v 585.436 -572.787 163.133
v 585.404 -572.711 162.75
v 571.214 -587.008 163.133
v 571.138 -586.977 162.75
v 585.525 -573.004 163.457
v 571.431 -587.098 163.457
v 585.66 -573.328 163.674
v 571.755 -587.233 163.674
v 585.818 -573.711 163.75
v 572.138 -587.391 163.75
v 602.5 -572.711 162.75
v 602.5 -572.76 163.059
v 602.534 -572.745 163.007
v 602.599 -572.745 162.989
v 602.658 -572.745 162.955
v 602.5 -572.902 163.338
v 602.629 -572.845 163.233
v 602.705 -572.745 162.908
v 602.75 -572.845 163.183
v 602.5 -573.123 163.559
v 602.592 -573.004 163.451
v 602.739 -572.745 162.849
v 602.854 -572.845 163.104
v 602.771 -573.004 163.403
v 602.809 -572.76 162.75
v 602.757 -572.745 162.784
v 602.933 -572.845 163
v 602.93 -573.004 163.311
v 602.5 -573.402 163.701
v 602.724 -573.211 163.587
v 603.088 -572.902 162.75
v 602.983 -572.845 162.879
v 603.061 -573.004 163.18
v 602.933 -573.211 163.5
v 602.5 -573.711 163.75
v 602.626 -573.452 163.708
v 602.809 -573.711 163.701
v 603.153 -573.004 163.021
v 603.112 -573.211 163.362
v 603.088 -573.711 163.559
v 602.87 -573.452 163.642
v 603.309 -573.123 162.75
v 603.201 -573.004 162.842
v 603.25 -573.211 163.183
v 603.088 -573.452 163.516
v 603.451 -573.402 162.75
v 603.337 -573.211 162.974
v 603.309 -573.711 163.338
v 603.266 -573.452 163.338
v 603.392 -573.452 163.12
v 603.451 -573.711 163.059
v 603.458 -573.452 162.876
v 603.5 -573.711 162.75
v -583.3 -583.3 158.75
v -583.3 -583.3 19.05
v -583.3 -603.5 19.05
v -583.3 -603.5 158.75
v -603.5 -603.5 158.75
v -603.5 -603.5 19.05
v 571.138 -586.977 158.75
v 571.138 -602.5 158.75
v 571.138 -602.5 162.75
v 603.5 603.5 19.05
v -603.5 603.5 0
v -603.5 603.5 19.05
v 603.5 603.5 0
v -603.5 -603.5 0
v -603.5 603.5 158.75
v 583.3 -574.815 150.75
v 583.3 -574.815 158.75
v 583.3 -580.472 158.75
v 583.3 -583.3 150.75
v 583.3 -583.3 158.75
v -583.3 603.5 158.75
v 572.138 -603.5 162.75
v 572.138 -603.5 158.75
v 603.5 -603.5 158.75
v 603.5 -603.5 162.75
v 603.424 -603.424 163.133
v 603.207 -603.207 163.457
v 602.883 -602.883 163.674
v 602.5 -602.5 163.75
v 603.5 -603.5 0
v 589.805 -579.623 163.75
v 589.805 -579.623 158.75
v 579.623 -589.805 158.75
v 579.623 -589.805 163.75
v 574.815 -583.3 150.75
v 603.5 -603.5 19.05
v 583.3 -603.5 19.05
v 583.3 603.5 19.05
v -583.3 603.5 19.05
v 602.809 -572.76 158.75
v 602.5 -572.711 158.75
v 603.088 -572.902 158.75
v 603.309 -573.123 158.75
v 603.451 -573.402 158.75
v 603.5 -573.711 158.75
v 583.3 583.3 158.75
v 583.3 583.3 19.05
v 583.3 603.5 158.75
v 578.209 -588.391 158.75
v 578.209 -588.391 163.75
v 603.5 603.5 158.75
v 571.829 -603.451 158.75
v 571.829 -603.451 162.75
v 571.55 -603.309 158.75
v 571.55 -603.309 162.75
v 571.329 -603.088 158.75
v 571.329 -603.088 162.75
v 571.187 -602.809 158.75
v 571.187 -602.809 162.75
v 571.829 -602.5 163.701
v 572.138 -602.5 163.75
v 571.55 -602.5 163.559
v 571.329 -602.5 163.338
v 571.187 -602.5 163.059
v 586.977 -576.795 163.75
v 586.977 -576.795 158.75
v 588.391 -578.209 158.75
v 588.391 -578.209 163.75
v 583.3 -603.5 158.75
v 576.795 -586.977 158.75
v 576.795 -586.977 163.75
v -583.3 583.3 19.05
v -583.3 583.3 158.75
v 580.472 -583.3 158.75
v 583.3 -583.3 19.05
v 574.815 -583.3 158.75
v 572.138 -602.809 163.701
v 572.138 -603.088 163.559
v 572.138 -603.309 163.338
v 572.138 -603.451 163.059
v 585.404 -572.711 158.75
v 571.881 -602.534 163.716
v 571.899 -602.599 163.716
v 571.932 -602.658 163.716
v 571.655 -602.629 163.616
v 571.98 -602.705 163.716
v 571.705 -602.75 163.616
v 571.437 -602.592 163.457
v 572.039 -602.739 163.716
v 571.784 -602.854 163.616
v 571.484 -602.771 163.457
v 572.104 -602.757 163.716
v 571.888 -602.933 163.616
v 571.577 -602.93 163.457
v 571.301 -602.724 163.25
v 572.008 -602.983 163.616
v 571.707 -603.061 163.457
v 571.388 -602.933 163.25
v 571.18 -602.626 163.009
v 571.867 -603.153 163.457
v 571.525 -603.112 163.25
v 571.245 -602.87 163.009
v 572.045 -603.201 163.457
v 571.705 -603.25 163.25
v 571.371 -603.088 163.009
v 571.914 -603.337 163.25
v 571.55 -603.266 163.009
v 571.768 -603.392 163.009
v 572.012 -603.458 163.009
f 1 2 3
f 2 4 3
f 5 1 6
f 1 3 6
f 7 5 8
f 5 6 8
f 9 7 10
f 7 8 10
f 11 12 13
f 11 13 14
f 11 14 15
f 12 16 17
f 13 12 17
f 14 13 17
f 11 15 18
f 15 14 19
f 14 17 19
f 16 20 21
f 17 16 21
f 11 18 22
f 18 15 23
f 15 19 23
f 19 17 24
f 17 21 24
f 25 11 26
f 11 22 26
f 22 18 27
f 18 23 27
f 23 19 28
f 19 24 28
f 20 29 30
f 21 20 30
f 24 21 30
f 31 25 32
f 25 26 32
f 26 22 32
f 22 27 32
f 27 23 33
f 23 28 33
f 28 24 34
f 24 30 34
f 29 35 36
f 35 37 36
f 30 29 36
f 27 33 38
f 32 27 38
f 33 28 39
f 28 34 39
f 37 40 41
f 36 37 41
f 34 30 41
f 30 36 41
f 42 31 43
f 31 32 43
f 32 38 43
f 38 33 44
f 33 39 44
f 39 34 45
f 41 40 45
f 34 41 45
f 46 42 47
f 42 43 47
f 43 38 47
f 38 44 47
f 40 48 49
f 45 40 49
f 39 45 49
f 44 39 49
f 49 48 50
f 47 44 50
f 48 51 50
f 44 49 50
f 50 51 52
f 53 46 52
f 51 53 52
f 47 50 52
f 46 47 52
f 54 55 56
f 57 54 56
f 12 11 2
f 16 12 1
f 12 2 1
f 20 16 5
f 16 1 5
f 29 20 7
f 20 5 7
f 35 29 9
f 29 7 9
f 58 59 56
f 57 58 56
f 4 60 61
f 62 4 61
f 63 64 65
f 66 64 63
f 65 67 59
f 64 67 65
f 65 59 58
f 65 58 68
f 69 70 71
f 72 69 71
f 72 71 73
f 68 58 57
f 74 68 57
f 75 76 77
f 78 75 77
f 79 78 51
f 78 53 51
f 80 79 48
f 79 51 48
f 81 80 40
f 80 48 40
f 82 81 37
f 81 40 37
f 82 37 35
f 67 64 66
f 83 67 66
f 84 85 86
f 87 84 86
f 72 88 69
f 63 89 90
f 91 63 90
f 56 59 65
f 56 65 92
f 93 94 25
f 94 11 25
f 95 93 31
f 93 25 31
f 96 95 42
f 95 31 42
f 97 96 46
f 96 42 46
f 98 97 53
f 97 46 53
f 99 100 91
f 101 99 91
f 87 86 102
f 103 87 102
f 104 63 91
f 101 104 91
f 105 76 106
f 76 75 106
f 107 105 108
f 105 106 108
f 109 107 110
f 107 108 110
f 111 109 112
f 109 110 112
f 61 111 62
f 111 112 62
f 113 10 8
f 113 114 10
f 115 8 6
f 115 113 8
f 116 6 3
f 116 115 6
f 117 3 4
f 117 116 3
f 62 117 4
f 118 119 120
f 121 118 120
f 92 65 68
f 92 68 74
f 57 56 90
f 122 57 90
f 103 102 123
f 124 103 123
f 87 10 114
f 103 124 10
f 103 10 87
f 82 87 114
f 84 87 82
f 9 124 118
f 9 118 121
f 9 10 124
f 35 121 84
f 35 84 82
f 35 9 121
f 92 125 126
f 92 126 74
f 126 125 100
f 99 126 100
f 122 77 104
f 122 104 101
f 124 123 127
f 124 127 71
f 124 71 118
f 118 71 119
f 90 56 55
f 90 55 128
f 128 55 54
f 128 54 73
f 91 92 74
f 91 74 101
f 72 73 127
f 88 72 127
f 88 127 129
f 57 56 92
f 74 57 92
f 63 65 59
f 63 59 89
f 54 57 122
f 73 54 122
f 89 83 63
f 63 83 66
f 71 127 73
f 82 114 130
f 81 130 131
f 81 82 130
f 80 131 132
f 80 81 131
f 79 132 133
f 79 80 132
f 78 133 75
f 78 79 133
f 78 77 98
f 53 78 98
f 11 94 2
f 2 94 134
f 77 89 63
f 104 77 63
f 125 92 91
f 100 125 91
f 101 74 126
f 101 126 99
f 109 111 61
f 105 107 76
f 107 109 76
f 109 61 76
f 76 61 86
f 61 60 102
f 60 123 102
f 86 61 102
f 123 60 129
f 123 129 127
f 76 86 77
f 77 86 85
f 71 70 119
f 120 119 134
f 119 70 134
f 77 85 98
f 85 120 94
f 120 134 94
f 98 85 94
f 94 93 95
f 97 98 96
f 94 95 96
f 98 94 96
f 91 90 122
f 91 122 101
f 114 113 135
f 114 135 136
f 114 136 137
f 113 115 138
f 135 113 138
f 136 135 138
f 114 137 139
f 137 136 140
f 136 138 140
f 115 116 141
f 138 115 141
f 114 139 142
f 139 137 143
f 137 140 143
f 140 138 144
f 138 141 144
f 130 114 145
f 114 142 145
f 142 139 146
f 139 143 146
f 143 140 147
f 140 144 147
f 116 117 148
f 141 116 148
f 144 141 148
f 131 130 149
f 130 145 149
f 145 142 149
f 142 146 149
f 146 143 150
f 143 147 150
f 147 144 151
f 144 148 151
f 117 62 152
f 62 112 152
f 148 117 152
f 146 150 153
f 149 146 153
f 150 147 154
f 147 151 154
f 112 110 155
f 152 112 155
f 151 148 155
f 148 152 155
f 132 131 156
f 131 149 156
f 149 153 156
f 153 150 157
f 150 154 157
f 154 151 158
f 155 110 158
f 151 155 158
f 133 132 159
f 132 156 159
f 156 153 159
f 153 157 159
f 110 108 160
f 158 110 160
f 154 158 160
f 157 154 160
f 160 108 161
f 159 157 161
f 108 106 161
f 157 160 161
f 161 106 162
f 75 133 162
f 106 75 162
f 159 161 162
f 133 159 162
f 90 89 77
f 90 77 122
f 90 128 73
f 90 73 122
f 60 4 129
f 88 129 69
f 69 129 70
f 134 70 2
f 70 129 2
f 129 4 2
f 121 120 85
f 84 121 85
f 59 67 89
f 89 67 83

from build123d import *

# Parameters (mm, degrees)
F0_W      = 1207
F0_H      = 1207
F1_DEPTH  = 19.05
F2_W      = 20.2
F2_H      = 1207
F3_DEPTH  = 139.7
F5_W      = 1166.6
F5_H      = 20.2
F6_DEPTH  = 139.7
F10_DEPTH = 5
F12_DEPTH = 8
F14_DEPTH = 5
F15_R     = 1


# Not quite as in the source:
# - two fillets or chamfers of one size are made in one step


with BuildPart() as f1:
    # F0 (on Top) → F1 (new body)
    with BuildSketch(Plane.XY):
        Rectangle(F0_W, F0_H)
    extrude(amount=F1_DEPTH)


with BuildPart() as f3:
    # F2 (on face) → F3 (new body)
    with BuildSketch(Plane.XY.offset(19.05)):
        with Locations((-593.4, 0)):
            Rectangle(F2_W, F2_H)
    extrude(amount=F3_DEPTH)


with BuildPart() as f4_1:
    # F4: instance of F3
    add(f3.part.mirror(Plane.YZ))


with BuildPart() as f6:
    # F5 (on face) → F6 (new body)
    with BuildSketch(Plane.XY.offset(19.05)):
        with Locations((0, 593.4)):
            Rectangle(F5_W, F5_H)
    extrude(amount=F6_DEPTH)


with BuildPart() as f7_1:
    # F7: instance of F6
    add(f6.part.mirror(Plane.XZ))


with BuildPart() as f10:
    # F9 (on offset) → F10 (new body)
    with BuildSketch(Plane.XY.offset(158.75)):
        Polygon((585.4039892925, -572.7107293333), (583.3, -574.8147186258), (583.3, -580.4715728753), (586.9769552622, -576.7946176131), (588.3911688245, -578.2088311755), (589.8053823869, -579.6230447378), (583.3, -586.1284271247), (583.3, -591.7852813742), (593.8063995238, -581.2788818505), align=None)
        Polygon((583.3, -580.4715728753), (583.3, -574.8147186258), (574.8147186258, -583.3), (580.4715728753, -583.3), align=None)
        Polygon((580.4715728753, -583.3), (574.8147186258, -583.3), (571.1377633636, -586.9769552622), (579.6230447378, -595.4622366364), (583.3, -591.7852813742), (583.3, -586.1284271247), (579.6230447378, -589.8053823869), (578.2088311755, -588.3911688245), (576.7946176131, -586.9769552622), align=None)
    extrude(amount=F10_DEPTH)

    # F11 (on face) → F12 (join)
    with BuildSketch(Plane(origin=(0, 0, 158.75), x_dir=(1, 0, 0), z_dir=(0, 0, -1))):
        Polygon((583.3, 583.3), (574.8147186258, 583.3), (583.3, 574.8147186258), align=None)
    extrude(amount=F12_DEPTH)

    # F13 (on face) → F14 (join)
    with BuildSketch(Plane.XY.offset(158.75)):
        Polygon((603.5, -572.7107293333), (585.4039892925, -572.7107293333), (571.1377633636, -586.9769552622), (571.1377633636, -603.5), (583.3, -603.5), (603.5, -603.5), align=None)
        Polygon((576.7946176131, -586.9769552622), (586.9769552622, -576.7946176131), (589.8053823869, -579.6230447378), (579.6230447378, -589.8053823869), align=None, mode=Mode.SUBTRACT)
    extrude(amount=F14_DEPTH)

    # F15
    f15_edges = [f10.edges().sort_by_distance(p)[0] for p in [
        (578.270876, -579.843842, 163.75),
        (571.137763, -603.5, 161.25),
        (571.137763, -595.238478, 163.75),
        (587.318882, -603.5, 163.75),
        (603.5, -588.105365, 163.75),
        (594.451995, -572.710729, 163.75),
        (603.5, -572.710729, 161.25),
    ]]
    fillet(f15_edges, radius=F15_R)


solid = Compound([f1.part, f3.part, f4_1.part, f6.part, f7_1.part, f10.part])
